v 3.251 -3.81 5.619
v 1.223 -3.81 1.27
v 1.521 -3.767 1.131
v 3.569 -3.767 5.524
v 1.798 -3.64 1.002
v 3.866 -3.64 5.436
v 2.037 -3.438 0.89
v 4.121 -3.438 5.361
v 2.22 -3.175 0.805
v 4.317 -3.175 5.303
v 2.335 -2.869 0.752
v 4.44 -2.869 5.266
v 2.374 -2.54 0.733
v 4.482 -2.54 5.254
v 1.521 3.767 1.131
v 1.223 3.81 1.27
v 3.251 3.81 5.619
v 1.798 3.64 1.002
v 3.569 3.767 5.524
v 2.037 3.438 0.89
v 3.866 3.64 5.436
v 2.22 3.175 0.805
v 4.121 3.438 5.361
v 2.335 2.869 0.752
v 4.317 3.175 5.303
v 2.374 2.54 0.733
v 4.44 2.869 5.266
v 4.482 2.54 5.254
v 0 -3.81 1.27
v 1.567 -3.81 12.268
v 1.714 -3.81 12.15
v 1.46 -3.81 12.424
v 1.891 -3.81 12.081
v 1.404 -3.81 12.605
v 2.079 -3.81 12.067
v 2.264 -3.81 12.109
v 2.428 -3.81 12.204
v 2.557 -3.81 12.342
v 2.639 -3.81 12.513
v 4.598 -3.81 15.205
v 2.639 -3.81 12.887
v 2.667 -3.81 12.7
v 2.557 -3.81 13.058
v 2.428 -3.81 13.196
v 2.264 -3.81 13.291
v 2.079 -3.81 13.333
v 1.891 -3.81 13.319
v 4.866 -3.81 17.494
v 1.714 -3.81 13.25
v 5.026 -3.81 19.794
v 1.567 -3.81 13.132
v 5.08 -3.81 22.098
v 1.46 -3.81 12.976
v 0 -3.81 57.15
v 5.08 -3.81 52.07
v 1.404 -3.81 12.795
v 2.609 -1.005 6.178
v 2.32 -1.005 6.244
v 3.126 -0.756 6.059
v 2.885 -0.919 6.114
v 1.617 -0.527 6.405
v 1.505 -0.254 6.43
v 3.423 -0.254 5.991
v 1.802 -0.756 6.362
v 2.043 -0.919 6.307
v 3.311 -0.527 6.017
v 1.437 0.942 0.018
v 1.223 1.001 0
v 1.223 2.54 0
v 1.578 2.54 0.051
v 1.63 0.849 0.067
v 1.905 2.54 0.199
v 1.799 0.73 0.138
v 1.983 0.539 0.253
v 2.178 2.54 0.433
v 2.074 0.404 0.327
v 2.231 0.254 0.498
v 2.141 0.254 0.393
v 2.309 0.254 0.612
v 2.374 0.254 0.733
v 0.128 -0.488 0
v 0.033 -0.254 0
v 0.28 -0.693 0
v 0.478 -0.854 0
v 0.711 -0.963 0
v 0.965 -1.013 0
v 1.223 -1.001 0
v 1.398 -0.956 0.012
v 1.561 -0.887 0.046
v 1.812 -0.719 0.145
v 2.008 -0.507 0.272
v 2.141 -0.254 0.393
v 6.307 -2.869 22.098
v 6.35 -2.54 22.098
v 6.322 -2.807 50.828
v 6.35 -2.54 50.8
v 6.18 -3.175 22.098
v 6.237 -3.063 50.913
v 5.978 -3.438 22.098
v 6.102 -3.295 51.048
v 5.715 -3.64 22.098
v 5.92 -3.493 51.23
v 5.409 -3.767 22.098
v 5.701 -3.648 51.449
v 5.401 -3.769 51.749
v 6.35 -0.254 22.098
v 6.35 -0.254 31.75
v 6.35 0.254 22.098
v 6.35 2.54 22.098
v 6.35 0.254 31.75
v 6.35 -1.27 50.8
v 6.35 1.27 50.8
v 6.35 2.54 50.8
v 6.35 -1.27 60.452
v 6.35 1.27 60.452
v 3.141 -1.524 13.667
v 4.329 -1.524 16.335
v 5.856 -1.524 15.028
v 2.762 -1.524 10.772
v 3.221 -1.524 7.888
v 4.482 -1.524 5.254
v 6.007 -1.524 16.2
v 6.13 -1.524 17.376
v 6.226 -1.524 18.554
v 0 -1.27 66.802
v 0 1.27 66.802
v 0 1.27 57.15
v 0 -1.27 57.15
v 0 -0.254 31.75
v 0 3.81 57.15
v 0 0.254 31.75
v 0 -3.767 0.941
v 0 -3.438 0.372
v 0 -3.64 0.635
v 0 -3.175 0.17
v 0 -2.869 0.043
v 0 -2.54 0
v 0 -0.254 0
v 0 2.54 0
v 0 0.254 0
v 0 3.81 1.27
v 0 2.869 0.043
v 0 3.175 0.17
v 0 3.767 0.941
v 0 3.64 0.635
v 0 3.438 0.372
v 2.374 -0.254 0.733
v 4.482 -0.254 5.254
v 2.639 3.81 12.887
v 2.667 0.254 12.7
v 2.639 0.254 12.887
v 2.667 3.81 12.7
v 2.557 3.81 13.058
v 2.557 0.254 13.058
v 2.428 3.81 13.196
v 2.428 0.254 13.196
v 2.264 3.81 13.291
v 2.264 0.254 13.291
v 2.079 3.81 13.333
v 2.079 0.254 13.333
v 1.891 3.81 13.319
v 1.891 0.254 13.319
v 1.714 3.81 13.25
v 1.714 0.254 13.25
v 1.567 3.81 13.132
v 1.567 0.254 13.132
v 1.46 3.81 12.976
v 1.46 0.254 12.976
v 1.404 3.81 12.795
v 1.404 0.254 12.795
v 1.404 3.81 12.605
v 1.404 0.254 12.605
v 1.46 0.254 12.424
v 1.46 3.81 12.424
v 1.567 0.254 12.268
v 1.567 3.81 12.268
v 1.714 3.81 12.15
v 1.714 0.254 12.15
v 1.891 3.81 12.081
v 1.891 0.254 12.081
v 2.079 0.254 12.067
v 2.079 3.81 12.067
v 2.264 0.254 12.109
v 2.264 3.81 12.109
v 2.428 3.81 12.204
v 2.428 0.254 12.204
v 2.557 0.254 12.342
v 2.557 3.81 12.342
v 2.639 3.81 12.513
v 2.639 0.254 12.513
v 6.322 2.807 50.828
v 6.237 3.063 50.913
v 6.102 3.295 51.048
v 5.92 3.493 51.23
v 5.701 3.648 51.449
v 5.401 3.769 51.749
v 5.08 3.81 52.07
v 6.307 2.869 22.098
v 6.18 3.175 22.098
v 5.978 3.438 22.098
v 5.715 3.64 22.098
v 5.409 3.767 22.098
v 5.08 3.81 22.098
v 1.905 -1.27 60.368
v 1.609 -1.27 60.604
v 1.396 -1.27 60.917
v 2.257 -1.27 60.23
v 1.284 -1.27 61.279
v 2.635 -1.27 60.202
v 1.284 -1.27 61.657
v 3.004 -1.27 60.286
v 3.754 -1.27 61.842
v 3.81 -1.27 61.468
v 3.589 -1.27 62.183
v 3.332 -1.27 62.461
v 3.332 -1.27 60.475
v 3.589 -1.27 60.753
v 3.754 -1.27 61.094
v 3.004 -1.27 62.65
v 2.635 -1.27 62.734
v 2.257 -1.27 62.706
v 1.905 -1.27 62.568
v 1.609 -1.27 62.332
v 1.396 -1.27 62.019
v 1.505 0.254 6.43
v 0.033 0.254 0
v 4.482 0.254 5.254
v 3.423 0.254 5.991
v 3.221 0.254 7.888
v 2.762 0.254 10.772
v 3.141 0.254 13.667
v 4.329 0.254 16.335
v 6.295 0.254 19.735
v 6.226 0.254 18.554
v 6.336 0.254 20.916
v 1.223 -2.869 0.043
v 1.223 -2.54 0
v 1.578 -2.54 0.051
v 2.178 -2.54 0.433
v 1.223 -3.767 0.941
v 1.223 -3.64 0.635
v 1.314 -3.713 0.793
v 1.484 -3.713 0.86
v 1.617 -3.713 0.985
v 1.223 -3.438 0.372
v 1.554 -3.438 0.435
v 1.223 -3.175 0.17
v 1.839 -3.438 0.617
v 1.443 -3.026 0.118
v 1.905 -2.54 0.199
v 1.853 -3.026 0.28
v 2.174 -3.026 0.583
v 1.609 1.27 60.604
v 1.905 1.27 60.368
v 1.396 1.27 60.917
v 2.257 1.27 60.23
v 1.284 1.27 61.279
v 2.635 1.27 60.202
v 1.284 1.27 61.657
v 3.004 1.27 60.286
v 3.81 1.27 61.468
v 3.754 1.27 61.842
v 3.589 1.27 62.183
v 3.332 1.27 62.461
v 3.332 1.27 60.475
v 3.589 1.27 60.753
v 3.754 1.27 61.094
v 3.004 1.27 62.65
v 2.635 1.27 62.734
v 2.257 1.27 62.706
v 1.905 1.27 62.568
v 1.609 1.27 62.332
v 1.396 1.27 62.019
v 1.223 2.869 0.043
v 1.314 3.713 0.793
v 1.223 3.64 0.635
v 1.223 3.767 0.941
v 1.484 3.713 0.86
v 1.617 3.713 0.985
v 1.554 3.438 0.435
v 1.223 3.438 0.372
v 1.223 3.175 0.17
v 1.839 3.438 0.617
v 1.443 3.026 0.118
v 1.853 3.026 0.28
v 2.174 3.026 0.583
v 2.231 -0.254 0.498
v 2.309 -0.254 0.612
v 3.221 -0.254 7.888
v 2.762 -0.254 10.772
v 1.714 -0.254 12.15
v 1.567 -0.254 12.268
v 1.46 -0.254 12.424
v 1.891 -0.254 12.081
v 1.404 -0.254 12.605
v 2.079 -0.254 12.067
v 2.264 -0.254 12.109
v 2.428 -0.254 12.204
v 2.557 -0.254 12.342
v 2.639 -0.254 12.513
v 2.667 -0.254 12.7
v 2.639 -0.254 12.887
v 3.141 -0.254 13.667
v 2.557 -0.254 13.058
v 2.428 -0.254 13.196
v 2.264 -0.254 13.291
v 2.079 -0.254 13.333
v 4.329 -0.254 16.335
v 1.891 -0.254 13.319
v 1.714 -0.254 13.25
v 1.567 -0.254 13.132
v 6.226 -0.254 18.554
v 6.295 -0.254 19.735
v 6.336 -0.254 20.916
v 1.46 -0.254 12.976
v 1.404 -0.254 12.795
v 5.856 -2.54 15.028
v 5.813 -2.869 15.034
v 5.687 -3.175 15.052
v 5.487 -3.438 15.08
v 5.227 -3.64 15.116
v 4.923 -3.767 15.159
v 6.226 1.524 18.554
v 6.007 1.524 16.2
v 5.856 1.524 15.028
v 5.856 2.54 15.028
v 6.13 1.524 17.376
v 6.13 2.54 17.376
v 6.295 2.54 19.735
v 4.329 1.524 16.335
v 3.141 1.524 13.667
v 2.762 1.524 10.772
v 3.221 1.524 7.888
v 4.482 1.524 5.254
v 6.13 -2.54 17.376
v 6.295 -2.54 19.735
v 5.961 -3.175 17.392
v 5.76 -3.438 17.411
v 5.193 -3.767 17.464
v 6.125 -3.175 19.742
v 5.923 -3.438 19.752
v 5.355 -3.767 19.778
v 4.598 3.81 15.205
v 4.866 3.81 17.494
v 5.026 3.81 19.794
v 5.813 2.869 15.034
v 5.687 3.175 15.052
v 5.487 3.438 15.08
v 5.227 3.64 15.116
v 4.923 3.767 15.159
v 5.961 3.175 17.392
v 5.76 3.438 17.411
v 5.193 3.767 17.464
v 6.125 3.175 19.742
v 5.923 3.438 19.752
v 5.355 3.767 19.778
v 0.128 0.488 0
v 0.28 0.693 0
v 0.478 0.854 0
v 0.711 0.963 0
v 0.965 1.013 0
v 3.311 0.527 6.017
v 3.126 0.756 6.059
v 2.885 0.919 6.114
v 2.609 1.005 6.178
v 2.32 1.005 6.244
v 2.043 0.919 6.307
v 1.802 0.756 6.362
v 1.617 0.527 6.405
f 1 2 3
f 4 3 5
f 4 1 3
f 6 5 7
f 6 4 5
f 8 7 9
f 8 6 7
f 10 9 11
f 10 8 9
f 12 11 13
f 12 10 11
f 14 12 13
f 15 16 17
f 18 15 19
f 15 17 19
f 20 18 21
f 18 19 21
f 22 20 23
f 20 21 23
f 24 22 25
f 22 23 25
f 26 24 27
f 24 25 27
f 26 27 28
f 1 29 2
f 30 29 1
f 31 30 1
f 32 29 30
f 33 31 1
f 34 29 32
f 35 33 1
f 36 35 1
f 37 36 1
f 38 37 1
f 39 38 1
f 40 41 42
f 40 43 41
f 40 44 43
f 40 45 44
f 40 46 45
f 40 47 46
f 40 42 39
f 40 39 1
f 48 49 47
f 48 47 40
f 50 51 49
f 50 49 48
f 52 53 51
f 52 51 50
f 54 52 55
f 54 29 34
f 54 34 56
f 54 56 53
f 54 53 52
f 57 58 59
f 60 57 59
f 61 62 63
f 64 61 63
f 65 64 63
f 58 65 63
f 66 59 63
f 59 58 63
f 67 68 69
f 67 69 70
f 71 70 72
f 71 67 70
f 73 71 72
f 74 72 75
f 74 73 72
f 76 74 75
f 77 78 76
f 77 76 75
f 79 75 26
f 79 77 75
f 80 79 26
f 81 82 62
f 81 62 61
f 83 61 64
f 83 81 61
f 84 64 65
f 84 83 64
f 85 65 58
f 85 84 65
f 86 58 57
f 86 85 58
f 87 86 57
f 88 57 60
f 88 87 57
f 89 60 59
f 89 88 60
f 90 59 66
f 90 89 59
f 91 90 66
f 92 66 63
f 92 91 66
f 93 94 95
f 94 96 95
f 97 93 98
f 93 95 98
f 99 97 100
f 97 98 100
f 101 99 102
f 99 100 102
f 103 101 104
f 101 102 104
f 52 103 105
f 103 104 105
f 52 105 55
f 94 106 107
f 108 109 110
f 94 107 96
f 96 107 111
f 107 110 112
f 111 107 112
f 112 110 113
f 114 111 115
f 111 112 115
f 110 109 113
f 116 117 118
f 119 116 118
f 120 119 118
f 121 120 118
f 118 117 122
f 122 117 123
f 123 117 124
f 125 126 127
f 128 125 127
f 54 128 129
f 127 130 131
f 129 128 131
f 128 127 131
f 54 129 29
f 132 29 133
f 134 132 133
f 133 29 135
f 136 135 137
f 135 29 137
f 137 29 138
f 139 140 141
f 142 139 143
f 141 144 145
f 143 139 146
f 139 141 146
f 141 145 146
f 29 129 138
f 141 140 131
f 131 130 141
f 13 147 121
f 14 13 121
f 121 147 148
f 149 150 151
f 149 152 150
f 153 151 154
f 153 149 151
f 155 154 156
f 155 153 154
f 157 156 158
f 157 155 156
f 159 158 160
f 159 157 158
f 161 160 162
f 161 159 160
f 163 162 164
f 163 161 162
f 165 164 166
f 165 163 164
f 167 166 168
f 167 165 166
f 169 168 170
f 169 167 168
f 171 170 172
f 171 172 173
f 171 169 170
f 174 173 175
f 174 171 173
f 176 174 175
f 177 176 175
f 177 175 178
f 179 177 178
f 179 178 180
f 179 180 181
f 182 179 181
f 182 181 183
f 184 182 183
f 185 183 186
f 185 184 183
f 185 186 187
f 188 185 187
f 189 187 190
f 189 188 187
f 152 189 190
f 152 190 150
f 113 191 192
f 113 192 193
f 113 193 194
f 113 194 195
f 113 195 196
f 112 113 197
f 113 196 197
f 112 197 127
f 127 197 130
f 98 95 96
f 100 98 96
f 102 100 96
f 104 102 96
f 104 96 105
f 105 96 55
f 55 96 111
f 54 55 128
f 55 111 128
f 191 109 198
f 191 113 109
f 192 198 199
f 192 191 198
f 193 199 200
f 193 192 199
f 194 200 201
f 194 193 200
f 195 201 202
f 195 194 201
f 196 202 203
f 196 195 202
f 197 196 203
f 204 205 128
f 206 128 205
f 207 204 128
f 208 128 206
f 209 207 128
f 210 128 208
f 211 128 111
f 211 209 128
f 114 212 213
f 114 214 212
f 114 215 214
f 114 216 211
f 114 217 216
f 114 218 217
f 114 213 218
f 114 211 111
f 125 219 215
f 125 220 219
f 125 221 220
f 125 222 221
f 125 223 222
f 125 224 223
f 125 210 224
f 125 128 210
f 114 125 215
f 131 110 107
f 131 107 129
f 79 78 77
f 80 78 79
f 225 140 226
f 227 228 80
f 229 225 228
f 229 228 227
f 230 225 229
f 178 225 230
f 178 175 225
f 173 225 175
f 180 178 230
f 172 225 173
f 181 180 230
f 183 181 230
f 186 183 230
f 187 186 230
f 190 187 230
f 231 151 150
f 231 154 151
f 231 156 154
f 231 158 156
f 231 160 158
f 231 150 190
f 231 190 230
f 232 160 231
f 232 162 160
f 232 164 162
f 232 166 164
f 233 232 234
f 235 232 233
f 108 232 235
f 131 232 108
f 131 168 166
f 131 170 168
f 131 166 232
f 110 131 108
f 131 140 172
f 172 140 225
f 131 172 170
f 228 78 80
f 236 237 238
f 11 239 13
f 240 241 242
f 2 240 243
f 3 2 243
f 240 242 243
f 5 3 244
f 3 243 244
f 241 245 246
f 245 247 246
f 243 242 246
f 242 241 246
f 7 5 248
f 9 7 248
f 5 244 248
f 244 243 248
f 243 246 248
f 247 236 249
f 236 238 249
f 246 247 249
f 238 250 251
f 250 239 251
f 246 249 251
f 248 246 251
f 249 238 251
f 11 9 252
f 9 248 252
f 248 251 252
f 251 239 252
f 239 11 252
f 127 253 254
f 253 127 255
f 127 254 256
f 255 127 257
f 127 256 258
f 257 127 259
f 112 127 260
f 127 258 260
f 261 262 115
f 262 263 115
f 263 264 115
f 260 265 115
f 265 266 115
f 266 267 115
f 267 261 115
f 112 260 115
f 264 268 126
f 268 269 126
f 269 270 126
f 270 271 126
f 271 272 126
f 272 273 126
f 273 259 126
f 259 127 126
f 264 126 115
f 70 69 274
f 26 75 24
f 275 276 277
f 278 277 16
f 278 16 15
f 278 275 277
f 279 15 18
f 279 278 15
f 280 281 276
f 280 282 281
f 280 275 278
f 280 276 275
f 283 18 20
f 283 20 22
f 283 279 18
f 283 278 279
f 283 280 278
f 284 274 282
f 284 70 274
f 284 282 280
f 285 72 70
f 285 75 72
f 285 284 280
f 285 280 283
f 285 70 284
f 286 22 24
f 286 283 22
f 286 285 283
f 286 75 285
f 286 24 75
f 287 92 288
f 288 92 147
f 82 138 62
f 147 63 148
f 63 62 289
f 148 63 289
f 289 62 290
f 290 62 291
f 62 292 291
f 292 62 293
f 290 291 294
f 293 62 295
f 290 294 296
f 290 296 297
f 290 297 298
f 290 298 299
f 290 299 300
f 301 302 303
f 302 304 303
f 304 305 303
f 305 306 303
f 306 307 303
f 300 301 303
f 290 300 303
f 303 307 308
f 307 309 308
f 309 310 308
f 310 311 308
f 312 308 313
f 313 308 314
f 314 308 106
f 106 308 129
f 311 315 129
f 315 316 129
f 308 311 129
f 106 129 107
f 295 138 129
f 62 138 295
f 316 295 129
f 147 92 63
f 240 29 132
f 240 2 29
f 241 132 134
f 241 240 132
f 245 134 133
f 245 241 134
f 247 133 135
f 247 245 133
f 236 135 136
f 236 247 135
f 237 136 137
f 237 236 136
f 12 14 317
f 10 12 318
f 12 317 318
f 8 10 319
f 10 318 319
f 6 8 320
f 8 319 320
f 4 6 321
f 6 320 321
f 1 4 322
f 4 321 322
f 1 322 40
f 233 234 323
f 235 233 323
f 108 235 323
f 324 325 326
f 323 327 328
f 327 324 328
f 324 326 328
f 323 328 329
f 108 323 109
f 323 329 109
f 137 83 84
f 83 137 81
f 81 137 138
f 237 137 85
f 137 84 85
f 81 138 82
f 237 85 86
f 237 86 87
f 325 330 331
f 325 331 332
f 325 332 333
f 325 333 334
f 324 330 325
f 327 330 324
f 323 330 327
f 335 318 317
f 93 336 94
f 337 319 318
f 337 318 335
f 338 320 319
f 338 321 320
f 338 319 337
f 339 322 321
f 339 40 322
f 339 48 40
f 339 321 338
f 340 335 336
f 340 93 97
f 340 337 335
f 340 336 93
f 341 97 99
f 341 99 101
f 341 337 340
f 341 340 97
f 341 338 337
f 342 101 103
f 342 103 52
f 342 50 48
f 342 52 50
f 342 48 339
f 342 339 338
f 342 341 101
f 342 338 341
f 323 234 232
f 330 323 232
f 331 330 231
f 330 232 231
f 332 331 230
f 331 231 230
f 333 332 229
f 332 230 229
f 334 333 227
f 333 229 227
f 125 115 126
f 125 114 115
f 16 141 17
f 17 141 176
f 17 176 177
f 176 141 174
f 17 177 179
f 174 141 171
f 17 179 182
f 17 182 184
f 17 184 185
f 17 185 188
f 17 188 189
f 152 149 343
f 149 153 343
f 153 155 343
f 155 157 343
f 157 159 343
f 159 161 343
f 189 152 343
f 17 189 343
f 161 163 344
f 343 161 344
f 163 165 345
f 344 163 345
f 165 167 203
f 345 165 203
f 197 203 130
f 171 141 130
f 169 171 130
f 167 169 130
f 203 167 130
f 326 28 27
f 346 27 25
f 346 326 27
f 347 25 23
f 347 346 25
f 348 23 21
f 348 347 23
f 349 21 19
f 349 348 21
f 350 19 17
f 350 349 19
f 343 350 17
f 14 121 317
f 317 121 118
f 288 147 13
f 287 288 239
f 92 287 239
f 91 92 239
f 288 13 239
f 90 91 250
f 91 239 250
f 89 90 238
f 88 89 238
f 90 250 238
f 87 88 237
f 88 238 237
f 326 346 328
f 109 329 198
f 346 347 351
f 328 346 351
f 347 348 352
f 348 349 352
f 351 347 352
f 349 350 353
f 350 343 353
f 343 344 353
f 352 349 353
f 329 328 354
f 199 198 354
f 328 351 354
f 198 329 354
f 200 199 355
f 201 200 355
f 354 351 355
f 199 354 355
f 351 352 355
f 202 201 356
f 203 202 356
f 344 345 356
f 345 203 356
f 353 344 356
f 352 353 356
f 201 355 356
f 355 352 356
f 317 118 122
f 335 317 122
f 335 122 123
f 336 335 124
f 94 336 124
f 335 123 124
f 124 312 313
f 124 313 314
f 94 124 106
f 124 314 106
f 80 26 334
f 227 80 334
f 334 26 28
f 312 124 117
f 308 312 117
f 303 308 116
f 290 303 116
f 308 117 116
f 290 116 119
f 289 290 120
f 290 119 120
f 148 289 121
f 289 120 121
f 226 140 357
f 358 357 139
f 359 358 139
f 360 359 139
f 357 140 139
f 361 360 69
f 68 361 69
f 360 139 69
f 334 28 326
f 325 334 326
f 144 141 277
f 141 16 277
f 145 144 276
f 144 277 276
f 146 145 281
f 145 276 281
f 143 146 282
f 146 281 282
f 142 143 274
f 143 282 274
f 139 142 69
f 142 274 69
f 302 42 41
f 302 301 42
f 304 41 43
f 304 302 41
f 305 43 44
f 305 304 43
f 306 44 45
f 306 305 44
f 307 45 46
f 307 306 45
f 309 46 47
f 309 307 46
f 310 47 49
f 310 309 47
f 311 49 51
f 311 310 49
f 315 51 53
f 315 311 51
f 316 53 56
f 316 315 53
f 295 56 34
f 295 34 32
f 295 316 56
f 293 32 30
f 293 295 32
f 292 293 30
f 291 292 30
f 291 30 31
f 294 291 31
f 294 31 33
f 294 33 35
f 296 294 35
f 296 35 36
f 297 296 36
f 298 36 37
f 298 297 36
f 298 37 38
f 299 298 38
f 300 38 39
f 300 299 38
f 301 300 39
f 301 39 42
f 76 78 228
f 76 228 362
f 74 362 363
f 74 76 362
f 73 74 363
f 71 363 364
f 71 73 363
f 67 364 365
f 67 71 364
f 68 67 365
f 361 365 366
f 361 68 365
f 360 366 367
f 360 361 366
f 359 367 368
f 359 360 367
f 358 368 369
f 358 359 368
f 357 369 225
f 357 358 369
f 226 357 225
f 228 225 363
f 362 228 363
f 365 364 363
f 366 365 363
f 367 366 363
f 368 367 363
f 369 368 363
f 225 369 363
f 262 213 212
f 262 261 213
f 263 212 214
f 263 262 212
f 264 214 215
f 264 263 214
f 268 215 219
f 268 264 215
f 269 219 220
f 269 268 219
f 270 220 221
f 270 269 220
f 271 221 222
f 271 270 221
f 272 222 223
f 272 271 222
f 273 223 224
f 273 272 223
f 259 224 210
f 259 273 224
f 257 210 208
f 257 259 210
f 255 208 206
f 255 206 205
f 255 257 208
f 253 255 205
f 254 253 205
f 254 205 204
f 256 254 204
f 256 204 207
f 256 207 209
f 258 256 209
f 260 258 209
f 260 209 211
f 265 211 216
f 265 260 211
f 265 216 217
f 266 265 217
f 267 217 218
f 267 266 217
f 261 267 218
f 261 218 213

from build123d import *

# Parameters (mm, degrees)
F0_R      = 0.635
F1_DEPTH  = 3.81
F2_R      = 0.635
F3_DEPTH  = 0.254
F5_DEPTH  = 1.524
F7_DEPTH  = 1.524
F9_R      = 1.016
F10_DEPTH = 6.604
F0_R_2    = 1.27
F11_DEPTH = 1.27
F12_R     = 1.27


# Not quite as in the source:
# - two fillets or chamfers of one size are made in one step
# - a pattern or mirror of a feature is missing from the dataset's text; its kind, count and spacing are read off the source's solid


with BuildPart() as f1:
    # F0 (on Front) → F1 (new body)
    with BuildSketch(Plane.XZ):
        with BuildLine():
            Line((6.35, 50.8), (0, 57.15))
            Line((0, 57.15), (0, 0))
            Line((0, 0), (2.032, 0))
            Line((2.032, 0), (4.4819667348, 5.2539706179))
            Line((4.4819667348, 5.2539706179), (5.8556178921, 15.0280064712))
            ThreePointArc((5.8556178921, 15.0280064712), (6.2262537532, 18.5543711338), (6.35, 22.098))
            Line((6.35, 22.098), (6.35, 50.8))
        make_face()
        with Locations((2.032, 12.7)):
            Circle(F0_R, mode=Mode.SUBTRACT)
    extrude(amount=-F1_DEPTH)

    # F1_copies: F1 across plane


with BuildPart() as f1_1:
    add(f1.part)
    add(f1.part.mirror(Plane(origin=(0, 0, 0), x_dir=(0, 0, -1), z_dir=(0, -1, 0))))

    # F2 (on face) → F3 (cut)
    with BuildSketch(Plane.XZ):
        with BuildLine():
            Line((6.35, 31.75), (0, 31.75))
            Line((0, 31.75), (0, 0))
            Line((0, 0), (2.032, 0))
            Line((2.032, 0), (4.4819667348, 5.2539706179))
            Line((4.4819667348, 5.2539706179), (5.8556178921, 15.0280064712))
            ThreePointArc((5.8556178921, 15.0280064712), (6.2262537532, 18.5543711338), (6.35, 22.098))
            Line((6.35, 22.098), (6.35, 31.75))
        make_face()
        with Locations((2.032, 12.7)):
            Circle(F2_R, mode=Mode.SUBTRACT)
    f3 = extrude(amount=-F3_DEPTH, mode=Mode.SUBTRACT)

    # F3_copies: F3 across plane
    add(f3.mirror(Plane(origin=(0, 0, 0), x_dir=(0, 0, -1), z_dir=(0, -1, 0))), mode=Mode.SUBTRACT)

    # F4 (on Front) → F5 (cut, symmetric)
    with BuildSketch(Plane.XZ):
        with BuildLine():
            Line((4.4819667348, 5.2539706179), (4.8144904791, 7.62))
            Line((4.8144904791, 7.62), (5.8556178921, 15.0280064712))
            ThreePointArc((5.8556178921, 15.0280064712), (6.0717122847, 16.787954066), (6.2262537532, 18.5543711338))
            ThreePointArc((6.2262537532, 18.5543711338), (2.8470783684, 12.2329567007), (4.4819667348, 5.2539706179))
        make_face()
        with BuildLine():
            Line((5.8556178921, 15.0280064712), (4.8144904791, 7.62))
            Line((4.8144904791, 7.62), (4.4819667348, 5.2539706179))
            Line((4.4819667348, 5.2539706179), (6.2262537532, 5.0006376953))
            Line((6.2262537532, 5.0006376953), (8.3210639079, 18.5543711338))
            Line((8.3210639079, 18.5543711338), (6.2262537532, 18.5543711338))
            ThreePointArc((6.2262537532, 18.5543711338), (6.0717122847, 16.787954066), (5.8556178921, 15.0280064712))
        make_face()
    extrude(amount=F5_DEPTH, both=True, mode=Mode.SUBTRACT)

    # F4 (on Front) → F7 (cut, symmetric)
    with BuildSketch(Plane.XZ):
        with BuildLine():
            Line((4.4819667348, 5.2539706179), (4.8144904791, 7.62))
            Line((4.8144904791, 7.62), (5.8556178921, 15.0280064712))
            ThreePointArc((5.8556178921, 15.0280064712), (6.0717122847, 16.787954066), (6.2262537532, 18.5543711338))
            ThreePointArc((6.2262537532, 18.5543711338), (2.8470783684, 12.2329567007), (4.4819667348, 5.2539706179))
        make_face()
        with BuildLine():
            Line((5.8556178921, 15.0280064712), (4.8144904791, 7.62))
            Line((4.8144904791, 7.62), (4.4819667348, 5.2539706179))
            Line((4.4819667348, 5.2539706179), (6.2262537532, 5.0006376953))
            Line((6.2262537532, 5.0006376953), (8.3210639079, 18.5543711338))
            Line((8.3210639079, 18.5543711338), (6.2262537532, 18.5543711338))
            ThreePointArc((6.2262537532, 18.5543711338), (6.0717122847, 16.787954066), (5.8556178921, 15.0280064712))
        make_face()
    extrude(amount=F7_DEPTH, both=True, mode=Mode.SUBTRACT)

    # F9 (on face) → F10 (cut)
    with BuildSketch(Plane(origin=(0, 0, 0), x_dir=(0.9747835757, 0, -0.2231523707), z_dir=(0.2231523707, 0, 0.9747835757))):
        with Locations((1.016, 0)):
            Circle(F9_R)
    extrude(amount=F10_DEPTH, mode=Mode.SUBTRACT)

    # F0 (on Front) → F11 (join, symmetric)
    with BuildSketch(Plane.XZ):
        Polygon((0, 66.802), (0, 57.15), (6.35, 50.8), (6.35, 60.452), align=None)
        with Locations((2.54, 61.468)):
            Circle(F0_R_2, mode=Mode.SUBTRACT)
    extrude(amount=F11_DEPTH, both=True)

    # F12 (call 1 of 2: OpenCascade refuses the feature's edges together)
    f12_edges = [f1_1.edges().sort_by_distance(p)[0] for p in [
        (1.016, 3.81, 0),
        (6.35, 3.81, 36.449),
        (6.226254, 3.81, 18.554371),
        (3.256983, 3.81, 2.626985),
        (5.168792, 3.81, 10.140989),
        (2.032, 2.06429, 0),
    ]]
    fillet(f12_edges, radius=F12_R)

    # F12#2 (call 2 of 2)
    f12_2_edges = [f1_1.edges().sort_by_distance(p)[0] for p in [
        (6.35, -3.81, 36.449),
        (1.016, -3.81, 0),
        (3.256983, -3.81, 2.626985),
        (5.168792, -3.81, 10.140989),
        (6.226254, -3.81, 18.554371),
        (2.032, -2.06429, 0),
    ]]
    fillet(f12_2_edges, radius=F12_R)


solid = f1_1.part
